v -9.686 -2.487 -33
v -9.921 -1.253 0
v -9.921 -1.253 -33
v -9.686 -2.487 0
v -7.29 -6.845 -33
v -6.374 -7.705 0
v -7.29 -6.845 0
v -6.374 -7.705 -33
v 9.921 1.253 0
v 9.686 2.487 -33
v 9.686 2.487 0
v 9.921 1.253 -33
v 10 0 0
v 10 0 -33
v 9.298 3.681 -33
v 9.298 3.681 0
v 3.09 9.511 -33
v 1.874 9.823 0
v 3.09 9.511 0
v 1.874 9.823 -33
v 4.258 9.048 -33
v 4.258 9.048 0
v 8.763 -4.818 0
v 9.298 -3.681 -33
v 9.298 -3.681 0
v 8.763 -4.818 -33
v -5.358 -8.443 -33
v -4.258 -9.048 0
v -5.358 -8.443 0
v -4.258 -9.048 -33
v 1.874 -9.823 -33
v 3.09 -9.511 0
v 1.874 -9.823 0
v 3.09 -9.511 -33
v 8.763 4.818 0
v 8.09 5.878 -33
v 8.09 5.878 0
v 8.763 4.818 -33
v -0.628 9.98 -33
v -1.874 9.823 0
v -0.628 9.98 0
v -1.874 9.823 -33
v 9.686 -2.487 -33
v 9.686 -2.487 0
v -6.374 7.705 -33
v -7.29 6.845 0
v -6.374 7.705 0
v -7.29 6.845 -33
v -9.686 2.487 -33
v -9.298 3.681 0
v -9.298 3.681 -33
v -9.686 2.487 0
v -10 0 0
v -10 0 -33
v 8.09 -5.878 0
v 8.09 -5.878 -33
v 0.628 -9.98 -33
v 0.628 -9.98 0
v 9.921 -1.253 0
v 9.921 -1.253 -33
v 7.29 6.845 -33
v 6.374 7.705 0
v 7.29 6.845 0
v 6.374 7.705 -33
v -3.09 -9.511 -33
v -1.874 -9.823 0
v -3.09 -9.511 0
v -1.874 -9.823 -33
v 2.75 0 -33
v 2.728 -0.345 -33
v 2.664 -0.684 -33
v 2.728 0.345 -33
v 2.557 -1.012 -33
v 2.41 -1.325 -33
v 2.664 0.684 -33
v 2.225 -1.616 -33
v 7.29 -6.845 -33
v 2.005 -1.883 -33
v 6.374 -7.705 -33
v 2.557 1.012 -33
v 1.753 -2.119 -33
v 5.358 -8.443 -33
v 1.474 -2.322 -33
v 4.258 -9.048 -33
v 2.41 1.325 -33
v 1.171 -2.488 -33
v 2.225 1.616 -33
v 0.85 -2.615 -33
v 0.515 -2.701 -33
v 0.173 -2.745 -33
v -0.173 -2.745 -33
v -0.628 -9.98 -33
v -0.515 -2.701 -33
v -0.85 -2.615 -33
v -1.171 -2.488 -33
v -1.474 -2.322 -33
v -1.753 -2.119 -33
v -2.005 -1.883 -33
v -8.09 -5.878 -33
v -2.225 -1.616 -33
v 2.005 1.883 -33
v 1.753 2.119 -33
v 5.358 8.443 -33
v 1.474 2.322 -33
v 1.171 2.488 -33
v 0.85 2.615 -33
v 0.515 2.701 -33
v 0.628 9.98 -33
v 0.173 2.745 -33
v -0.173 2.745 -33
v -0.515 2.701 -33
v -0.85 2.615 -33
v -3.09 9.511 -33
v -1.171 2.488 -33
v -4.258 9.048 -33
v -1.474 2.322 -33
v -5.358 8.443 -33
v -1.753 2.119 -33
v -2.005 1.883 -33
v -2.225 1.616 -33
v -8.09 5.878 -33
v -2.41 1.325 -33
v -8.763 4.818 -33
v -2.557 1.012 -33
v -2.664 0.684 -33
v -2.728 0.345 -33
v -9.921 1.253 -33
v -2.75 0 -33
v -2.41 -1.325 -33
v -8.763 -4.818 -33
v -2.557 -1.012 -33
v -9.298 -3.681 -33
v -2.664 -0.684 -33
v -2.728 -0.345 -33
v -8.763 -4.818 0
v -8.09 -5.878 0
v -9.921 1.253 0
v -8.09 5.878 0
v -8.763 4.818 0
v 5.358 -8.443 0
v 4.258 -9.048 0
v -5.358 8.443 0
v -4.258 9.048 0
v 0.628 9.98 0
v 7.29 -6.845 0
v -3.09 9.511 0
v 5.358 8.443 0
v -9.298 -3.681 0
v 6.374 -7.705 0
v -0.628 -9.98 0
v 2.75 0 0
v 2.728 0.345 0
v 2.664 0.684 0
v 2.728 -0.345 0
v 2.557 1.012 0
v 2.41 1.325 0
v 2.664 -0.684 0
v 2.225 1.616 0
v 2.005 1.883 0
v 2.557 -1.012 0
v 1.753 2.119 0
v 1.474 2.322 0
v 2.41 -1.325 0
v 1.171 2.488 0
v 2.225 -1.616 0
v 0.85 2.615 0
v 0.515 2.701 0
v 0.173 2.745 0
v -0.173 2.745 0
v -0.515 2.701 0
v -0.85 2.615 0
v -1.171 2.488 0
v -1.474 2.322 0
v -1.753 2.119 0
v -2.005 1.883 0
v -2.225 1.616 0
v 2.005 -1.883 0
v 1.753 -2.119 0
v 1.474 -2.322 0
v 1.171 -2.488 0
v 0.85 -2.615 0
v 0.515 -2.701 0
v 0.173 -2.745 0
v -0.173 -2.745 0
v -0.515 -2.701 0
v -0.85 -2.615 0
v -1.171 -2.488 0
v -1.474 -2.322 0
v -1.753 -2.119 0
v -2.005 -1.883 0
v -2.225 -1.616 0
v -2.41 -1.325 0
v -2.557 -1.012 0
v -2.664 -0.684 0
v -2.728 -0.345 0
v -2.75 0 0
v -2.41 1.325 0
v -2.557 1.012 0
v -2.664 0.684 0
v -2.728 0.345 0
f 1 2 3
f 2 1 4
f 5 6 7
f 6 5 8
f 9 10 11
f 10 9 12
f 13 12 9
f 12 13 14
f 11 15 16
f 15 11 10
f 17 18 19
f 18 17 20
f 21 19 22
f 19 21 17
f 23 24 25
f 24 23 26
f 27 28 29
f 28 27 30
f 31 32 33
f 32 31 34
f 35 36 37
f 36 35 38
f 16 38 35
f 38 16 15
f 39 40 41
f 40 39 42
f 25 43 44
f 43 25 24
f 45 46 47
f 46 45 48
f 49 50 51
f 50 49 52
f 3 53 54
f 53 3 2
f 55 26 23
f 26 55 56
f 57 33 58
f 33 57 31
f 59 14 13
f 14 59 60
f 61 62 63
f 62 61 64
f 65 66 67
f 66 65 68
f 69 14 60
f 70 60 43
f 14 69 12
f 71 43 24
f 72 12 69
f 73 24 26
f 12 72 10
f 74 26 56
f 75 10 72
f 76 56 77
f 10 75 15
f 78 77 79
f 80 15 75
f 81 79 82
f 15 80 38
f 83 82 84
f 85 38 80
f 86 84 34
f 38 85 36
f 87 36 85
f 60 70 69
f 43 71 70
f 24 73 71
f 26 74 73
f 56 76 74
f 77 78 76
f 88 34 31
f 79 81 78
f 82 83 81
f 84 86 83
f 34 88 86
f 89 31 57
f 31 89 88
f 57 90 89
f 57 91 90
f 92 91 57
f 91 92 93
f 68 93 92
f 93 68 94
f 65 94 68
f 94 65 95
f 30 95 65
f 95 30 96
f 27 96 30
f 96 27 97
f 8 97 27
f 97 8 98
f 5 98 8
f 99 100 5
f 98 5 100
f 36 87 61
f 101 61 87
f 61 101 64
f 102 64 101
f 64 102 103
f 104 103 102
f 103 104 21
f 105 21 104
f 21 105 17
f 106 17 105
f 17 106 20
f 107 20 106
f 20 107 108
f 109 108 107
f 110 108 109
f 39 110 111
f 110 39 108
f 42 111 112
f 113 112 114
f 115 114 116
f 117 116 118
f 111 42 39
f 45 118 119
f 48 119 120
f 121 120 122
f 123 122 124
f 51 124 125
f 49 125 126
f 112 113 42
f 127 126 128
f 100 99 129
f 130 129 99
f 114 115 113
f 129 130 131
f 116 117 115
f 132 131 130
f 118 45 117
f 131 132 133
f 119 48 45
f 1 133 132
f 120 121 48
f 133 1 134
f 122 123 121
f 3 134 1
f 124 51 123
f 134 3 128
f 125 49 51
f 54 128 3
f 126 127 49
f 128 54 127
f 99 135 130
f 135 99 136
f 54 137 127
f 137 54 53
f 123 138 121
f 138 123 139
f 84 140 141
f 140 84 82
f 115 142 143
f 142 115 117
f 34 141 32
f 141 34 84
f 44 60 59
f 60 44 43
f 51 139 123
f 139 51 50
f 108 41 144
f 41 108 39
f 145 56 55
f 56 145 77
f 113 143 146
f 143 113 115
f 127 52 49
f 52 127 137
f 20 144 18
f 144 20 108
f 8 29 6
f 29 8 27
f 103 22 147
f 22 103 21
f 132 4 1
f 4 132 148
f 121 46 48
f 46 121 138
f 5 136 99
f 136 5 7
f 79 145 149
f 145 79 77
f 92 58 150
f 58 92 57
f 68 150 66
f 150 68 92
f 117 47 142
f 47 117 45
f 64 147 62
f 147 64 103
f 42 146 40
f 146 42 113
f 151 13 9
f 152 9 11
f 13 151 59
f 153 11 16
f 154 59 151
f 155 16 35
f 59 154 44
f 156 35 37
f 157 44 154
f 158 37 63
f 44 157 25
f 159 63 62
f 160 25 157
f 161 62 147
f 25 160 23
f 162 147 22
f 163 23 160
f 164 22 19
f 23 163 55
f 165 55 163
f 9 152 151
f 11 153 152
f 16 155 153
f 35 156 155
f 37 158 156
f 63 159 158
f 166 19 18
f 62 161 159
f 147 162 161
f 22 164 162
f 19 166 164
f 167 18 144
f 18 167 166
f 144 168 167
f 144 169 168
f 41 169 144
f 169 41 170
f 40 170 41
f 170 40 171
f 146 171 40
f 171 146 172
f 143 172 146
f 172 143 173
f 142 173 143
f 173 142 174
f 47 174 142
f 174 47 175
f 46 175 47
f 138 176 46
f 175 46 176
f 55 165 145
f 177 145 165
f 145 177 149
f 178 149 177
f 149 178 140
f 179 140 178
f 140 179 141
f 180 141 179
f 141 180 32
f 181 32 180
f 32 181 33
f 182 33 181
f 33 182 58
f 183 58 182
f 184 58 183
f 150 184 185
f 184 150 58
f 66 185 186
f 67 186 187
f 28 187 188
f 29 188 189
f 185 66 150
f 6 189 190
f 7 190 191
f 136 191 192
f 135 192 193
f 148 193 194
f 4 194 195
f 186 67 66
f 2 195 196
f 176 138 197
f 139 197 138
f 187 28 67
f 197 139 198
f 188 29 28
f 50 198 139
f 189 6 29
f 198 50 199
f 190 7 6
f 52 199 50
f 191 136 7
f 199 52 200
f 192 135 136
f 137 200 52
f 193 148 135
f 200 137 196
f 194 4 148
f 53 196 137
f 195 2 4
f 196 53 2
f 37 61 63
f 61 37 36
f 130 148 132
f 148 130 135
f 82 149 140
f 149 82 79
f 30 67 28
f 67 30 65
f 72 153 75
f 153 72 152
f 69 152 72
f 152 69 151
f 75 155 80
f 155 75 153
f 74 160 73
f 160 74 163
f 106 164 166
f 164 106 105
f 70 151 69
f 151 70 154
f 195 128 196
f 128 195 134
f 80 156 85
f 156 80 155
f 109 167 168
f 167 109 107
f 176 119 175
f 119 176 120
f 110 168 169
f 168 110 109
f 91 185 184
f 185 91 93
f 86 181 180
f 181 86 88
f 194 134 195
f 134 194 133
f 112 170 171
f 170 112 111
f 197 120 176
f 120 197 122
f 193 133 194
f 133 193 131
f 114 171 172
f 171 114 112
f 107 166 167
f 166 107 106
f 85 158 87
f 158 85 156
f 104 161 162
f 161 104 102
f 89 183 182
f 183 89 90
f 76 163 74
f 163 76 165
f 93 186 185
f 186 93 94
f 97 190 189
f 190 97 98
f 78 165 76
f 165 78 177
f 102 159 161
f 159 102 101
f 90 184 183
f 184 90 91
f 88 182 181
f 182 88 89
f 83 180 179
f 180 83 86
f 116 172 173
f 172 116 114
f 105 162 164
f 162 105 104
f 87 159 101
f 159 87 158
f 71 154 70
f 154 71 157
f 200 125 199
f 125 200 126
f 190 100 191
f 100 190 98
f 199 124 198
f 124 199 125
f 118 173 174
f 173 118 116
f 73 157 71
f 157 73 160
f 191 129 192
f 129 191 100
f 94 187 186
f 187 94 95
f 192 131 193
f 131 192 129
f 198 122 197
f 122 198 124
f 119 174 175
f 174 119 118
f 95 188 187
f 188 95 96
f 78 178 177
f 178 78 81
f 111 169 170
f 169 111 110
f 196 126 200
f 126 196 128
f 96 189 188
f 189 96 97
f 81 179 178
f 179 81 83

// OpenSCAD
$fn = 50;


difference() {
	union() {
		translate(v = [0, 0, -33.0000000000]) {
			cylinder(h = 33, r = 10.0000000000);
		}
		cylinder(h = 0, r = 16.0000000000);
	}
	union() {
		#translate(v = [0, 0, -33]) {
			cylinder(h = 33, r = 2.7500000000);
		}
	}
}
